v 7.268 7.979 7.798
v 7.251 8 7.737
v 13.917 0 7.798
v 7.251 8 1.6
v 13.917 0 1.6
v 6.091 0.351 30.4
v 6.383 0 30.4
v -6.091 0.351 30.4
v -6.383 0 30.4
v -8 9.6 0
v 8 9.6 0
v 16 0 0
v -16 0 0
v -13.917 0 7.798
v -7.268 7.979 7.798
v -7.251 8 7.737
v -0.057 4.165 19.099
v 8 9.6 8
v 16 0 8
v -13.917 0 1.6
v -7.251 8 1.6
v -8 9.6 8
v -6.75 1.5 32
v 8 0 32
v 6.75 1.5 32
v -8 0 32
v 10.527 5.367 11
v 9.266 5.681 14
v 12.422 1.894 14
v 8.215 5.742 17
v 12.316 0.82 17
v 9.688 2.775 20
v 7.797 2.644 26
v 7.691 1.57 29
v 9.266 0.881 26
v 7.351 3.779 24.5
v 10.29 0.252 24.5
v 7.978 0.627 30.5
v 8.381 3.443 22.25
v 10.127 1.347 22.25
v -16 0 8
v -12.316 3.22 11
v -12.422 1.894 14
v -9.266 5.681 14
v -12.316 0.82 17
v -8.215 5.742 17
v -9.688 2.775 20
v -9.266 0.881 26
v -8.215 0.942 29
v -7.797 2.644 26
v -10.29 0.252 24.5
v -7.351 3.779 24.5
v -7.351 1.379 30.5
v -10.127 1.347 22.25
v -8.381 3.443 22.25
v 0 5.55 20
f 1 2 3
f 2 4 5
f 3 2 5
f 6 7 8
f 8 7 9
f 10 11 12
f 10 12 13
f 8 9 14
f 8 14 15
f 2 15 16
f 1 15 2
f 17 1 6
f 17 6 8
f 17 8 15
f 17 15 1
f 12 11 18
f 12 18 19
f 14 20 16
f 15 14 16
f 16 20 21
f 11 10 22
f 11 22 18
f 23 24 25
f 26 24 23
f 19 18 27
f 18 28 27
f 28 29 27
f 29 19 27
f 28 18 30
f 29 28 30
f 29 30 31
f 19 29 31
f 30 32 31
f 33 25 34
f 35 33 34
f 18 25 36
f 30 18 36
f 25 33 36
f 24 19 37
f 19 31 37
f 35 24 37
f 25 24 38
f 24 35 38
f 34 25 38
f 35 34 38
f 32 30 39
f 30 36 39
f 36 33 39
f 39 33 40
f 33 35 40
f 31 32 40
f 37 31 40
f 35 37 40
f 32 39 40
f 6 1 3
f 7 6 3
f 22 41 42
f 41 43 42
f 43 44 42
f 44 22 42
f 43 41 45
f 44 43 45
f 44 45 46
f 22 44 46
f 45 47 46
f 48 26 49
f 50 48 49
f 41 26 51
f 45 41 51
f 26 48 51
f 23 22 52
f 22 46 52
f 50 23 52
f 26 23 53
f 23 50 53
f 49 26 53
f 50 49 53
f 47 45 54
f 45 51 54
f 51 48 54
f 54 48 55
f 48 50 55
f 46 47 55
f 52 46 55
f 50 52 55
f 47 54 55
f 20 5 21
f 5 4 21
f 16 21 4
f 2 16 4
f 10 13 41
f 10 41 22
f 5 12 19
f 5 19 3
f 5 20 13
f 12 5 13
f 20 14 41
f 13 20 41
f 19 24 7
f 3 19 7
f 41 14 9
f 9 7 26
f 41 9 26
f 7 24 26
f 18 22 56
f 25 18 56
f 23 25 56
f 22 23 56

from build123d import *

# Parameters (mm, degrees)
BOSS_EXTRUDE1_DEPTH = 8
SHELL1_T            = -1.6


with BuildPart() as part:
    # Sketch1 → Boss-Extrude1 (new body)
    with BuildSketch(Plane.XY):
        Polygon((-8, 9.6), (8, 9.6), (16, 0), (-16, 0), align=None)
    extrude(amount=BOSS_EXTRUDE1_DEPTH)

    # Sketch2 → section 1 of loft1
    with BuildSketch(Plane.XY.offset(32), mode=Mode.PRIVATE) as loft1_s1:
        with BuildLine():
            Line((-8, 0), (8, 0))
            Line((8, 0), (6.75, 1.5))
            Line((6.75, 1.5), (-6.75, 1.5))
            Line((-6.75, 1.5), (-8, 0))
        make_face()
    # loft from a face of the part (loft1)
    loft([part.faces().sort_by_distance((0, 4.266666667, 8))[0], loft1_s1.sketch])

    # Shell1
    shell1_openings = [part.faces().sort_by_distance(p)[0] for p in [
        (0, 0, 14.153846154),
    ]]
    offset(amount=SHELL1_T, openings=shell1_openings)


solid = part.part
